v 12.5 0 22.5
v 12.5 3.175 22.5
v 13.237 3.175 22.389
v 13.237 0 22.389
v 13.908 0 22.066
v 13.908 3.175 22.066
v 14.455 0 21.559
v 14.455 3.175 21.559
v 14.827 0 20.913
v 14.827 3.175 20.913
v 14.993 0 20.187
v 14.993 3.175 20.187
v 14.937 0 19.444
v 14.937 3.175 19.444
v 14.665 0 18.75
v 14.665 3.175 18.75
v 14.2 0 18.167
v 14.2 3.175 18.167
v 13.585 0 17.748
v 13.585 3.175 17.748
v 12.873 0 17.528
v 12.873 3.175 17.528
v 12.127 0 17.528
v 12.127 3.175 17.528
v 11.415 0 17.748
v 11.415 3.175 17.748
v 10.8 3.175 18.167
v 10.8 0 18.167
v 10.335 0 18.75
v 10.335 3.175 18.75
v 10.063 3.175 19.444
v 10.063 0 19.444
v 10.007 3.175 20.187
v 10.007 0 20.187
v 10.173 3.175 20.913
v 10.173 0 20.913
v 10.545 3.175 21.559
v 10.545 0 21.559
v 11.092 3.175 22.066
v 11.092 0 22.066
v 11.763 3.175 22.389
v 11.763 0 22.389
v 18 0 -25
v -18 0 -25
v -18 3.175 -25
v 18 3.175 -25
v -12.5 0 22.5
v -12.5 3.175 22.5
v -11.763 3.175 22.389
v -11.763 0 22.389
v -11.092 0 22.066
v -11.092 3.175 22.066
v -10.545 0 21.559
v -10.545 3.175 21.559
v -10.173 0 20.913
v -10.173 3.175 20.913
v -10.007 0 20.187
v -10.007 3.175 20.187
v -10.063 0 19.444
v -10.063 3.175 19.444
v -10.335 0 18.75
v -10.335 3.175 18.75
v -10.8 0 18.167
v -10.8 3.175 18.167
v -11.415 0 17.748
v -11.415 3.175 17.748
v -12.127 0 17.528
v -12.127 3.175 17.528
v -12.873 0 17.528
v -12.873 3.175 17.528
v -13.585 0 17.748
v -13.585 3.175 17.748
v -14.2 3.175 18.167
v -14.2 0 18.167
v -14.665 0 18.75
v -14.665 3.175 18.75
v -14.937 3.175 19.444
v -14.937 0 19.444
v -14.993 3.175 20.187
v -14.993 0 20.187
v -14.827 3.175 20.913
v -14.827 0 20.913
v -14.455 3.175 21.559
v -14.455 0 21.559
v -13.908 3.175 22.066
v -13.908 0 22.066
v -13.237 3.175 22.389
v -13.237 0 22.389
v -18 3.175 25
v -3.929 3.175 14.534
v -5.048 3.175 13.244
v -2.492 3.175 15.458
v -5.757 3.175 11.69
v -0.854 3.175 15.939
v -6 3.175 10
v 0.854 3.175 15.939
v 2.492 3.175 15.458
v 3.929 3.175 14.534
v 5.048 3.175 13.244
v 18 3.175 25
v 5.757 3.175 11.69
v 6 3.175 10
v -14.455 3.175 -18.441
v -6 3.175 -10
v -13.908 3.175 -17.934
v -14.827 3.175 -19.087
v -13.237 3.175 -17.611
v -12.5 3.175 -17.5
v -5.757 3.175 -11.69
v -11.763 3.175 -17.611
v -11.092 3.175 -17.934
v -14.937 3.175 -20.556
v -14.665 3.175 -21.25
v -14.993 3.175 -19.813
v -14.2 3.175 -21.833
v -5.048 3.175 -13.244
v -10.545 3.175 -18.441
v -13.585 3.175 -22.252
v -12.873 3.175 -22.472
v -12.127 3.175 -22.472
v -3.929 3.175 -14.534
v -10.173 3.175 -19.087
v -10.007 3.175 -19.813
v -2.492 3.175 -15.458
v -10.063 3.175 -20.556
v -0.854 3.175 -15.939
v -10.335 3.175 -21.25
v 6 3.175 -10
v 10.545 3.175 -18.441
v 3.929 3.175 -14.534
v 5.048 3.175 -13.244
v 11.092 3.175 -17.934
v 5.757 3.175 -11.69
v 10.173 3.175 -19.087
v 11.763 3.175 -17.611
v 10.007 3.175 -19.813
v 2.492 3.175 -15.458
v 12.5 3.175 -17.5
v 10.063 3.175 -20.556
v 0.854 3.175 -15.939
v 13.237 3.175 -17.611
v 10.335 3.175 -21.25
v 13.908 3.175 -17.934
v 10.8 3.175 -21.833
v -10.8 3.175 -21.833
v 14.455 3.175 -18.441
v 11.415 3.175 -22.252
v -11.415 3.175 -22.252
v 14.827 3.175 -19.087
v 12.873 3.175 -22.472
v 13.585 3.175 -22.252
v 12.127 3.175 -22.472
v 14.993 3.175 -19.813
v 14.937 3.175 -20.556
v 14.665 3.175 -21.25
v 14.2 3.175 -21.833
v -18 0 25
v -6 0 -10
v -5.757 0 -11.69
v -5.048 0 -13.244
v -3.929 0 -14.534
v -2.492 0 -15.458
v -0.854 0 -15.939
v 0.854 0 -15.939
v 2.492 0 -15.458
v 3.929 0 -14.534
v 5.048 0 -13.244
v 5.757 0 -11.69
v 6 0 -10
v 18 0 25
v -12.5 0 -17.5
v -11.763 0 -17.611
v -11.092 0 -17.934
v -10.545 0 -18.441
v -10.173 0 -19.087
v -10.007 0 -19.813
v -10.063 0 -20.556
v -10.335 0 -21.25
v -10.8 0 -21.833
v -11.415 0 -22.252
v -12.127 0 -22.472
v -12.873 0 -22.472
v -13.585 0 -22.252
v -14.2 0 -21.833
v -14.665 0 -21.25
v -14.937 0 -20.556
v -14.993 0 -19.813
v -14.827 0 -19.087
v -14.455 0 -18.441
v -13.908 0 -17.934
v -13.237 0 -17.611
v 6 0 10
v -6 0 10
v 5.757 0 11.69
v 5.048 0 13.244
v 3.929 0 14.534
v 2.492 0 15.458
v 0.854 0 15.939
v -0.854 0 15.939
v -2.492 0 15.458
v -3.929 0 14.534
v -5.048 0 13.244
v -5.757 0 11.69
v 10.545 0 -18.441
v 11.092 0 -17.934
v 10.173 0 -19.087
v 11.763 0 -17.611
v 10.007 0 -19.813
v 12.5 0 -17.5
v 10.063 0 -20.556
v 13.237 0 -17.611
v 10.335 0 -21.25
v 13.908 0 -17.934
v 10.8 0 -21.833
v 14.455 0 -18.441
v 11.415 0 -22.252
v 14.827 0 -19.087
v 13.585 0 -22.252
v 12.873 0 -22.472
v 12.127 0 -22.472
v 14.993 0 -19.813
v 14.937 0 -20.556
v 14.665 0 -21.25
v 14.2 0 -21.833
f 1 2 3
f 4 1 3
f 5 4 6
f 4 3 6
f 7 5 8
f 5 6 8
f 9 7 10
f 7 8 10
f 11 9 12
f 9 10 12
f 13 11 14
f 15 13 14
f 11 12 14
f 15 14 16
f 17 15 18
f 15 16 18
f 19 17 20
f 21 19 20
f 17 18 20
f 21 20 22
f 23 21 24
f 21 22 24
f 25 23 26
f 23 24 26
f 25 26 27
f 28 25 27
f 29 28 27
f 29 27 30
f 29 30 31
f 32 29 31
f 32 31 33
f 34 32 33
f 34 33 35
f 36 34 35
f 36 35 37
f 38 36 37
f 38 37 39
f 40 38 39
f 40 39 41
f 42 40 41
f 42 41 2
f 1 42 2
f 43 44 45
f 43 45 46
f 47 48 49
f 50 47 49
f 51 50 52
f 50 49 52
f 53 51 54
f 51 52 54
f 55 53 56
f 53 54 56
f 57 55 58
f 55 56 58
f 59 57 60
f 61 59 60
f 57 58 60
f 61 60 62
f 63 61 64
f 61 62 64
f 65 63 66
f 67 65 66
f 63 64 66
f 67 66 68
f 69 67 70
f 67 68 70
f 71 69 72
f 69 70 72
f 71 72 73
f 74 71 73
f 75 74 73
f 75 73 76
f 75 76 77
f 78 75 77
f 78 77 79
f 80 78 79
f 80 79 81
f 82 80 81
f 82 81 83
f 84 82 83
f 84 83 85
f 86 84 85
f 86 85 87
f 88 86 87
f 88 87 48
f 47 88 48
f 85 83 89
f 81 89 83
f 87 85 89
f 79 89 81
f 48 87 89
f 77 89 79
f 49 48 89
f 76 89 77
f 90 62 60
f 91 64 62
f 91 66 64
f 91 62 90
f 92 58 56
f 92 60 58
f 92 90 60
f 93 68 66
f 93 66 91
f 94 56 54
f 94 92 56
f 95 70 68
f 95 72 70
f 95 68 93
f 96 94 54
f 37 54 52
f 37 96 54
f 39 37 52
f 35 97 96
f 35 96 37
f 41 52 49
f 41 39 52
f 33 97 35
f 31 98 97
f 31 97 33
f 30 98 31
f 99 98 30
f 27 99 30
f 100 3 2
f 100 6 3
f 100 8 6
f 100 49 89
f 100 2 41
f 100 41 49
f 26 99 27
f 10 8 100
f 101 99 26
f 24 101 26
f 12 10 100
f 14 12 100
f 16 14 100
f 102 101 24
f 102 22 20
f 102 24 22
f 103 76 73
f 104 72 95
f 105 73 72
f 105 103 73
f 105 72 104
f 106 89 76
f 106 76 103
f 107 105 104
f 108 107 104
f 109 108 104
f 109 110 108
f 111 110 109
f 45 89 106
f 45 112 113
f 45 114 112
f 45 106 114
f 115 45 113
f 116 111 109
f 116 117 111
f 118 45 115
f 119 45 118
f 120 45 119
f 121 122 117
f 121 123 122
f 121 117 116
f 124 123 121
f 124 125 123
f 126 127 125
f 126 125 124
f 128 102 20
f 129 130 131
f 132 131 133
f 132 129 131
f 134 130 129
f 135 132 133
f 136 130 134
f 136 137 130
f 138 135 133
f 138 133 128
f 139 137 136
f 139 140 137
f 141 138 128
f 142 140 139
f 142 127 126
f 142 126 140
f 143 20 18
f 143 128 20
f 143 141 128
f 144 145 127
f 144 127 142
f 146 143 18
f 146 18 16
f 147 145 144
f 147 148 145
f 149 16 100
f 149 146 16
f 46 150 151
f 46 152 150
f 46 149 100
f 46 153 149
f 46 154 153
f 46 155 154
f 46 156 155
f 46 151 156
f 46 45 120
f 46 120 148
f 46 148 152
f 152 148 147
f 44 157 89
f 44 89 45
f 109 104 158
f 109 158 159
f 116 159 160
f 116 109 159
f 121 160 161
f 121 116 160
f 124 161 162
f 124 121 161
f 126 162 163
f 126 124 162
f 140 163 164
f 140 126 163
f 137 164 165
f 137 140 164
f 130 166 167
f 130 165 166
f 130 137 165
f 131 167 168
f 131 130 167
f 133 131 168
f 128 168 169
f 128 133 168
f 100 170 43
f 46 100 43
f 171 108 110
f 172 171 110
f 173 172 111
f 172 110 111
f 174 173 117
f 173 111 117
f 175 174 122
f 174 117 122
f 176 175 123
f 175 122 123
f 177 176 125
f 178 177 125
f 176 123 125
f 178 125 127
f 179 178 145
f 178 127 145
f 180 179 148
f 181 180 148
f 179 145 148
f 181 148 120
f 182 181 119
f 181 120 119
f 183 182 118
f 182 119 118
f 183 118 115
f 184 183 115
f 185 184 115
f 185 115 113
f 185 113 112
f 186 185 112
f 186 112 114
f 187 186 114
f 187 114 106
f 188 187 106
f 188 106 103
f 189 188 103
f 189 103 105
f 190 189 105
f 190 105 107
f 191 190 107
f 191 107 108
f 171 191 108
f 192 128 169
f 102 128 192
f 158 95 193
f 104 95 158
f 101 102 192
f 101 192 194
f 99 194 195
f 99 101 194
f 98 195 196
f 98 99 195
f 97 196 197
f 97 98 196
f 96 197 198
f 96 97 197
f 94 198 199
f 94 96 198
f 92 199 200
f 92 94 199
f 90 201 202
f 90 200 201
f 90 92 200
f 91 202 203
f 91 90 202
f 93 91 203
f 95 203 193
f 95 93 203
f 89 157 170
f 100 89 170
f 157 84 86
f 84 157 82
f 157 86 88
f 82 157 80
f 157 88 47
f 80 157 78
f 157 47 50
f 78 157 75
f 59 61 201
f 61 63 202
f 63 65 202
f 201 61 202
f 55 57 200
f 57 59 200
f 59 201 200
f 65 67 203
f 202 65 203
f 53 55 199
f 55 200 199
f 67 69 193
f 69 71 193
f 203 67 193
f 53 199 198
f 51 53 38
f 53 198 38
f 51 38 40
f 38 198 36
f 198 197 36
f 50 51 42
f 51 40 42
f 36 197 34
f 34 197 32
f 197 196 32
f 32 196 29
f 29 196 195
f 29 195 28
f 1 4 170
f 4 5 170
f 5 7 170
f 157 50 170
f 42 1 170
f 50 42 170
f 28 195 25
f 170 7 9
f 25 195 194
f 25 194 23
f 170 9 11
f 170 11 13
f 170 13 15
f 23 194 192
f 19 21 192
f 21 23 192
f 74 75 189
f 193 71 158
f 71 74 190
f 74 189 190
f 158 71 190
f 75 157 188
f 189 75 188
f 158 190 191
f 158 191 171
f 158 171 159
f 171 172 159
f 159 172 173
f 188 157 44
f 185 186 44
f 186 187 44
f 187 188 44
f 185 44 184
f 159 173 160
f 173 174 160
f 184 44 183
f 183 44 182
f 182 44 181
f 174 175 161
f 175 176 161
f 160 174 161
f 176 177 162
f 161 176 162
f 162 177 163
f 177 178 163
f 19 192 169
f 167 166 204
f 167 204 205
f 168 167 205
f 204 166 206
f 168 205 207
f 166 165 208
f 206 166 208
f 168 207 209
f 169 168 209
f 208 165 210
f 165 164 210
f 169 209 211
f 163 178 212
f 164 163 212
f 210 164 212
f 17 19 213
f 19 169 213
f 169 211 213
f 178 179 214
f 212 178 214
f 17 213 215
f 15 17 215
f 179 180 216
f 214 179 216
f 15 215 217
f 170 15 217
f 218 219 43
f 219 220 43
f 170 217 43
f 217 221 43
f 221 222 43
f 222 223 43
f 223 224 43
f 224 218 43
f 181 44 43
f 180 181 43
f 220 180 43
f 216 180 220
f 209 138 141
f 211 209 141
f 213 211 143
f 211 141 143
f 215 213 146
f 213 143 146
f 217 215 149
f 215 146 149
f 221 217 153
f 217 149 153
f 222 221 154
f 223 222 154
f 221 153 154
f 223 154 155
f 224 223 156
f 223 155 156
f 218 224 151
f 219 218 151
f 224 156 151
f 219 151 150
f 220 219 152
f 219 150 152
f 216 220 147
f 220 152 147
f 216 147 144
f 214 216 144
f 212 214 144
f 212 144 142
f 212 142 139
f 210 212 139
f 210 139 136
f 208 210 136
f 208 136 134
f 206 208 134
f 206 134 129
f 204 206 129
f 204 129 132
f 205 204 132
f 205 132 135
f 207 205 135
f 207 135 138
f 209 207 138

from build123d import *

# Parameters (mm, degrees)
SKETCH1_W           = 36
SKETCH1_H           = 50
BOSS_EXTRUDE1_DEPTH = 3.175
CUT_EXTRUDE1_REACH  = 32.969
SKETCH3_R           = 2.5
CUT_EXTRUDE2_REACH  = 32.969


with BuildPart() as part:
    # Sketch1 → Boss-Extrude1 (new body)
    with BuildSketch(Plane(origin=(0, 0, 0), x_dir=(1, 0, 0), z_dir=(0, 1, 0))):
        Rectangle(SKETCH1_W, SKETCH1_H)
    extrude(amount=BOSS_EXTRUDE1_DEPTH)

    # Sketch3 → Cut-Extrude1 (cut, up to next)
    with BuildSketch(Plane(origin=(0, 3.175, 0), x_dir=(1, 0, 0), z_dir=(0, 1, 0)), mode=Mode.PRIVATE) as cut_extrude1_sk1:
        with Locations(Location((-12.5, 20, 0), (0, 0, 270))):
            Circle(SKETCH3_R)
    cut_extrude1_tool1 = extrude(cut_extrude1_sk1.sketch, amount=-CUT_EXTRUDE1_REACH, mode=Mode.PRIVATE) & part.part
    # Sketch3 → Cut-Extrude1 (cut, up to next)
    with BuildSketch(Plane(origin=(0, 3.175, 0), x_dir=(1, 0, 0), z_dir=(0, 1, 0)), mode=Mode.PRIVATE) as cut_extrude1_sk2:
        with Locations(Location((12.5, 20, 0), (0, 0, 270))):
            Circle(SKETCH3_R)
    cut_extrude1_tool2 = extrude(cut_extrude1_sk2.sketch, amount=-CUT_EXTRUDE1_REACH, mode=Mode.PRIVATE) & part.part
    # Sketch3 → Cut-Extrude1 (cut, up to next)
    with BuildSketch(Plane(origin=(0, 3.175, 0), x_dir=(1, 0, 0), z_dir=(0, 1, 0)), mode=Mode.PRIVATE) as cut_extrude1_sk3:
        with Locations(Location((12.5, -20, 0), (0, 0, 270))):
            Circle(SKETCH3_R)
    cut_extrude1_tool3 = extrude(cut_extrude1_sk3.sketch, amount=-CUT_EXTRUDE1_REACH, mode=Mode.PRIVATE) & part.part
    # Sketch3 → Cut-Extrude1 (cut, up to next)
    with BuildSketch(Plane(origin=(0, 3.175, 0), x_dir=(1, 0, 0), z_dir=(0, 1, 0)), mode=Mode.PRIVATE) as cut_extrude1_sk4:
        with Locations(Location((-12.5, -20, 0), (0, 0, 270))):
            Circle(SKETCH3_R)
    cut_extrude1_tool4 = extrude(cut_extrude1_sk4.sketch, amount=-CUT_EXTRUDE1_REACH, mode=Mode.PRIVATE) & part.part
    add(cut_extrude1_tool1.solids().sort_by_distance((-12.5, 3.175, -20))[0], mode=Mode.SUBTRACT)
    add(cut_extrude1_tool2.solids().sort_by_distance((12.5, 3.175, -20))[0], mode=Mode.SUBTRACT)
    add(cut_extrude1_tool3.solids().sort_by_distance((12.5, 3.175, 20))[0], mode=Mode.SUBTRACT)
    add(cut_extrude1_tool4.solids().sort_by_distance((-12.5, 3.175, 20))[0], mode=Mode.SUBTRACT)

    # Sketch4 → Cut-Extrude2 (cut, up to next)
    with BuildSketch(Plane(origin=(0, 3.175, 0), x_dir=(1, 0, 0), z_dir=(0, 1, 0)), mode=Mode.PRIVATE) as cut_extrude2_sk1:
        with BuildLine():
            Line((-6, -10), (-6, 10))
            ThreePointArc((-6, 10), (0, 16), (6, 10))
            Line((6, 10), (6, -10))
            ThreePointArc((6, -10), (0, -16), (-6, -10))
        make_face()
    cut_extrude2_tool1 = extrude(cut_extrude2_sk1.sketch, amount=-CUT_EXTRUDE2_REACH, mode=Mode.PRIVATE) & part.part
    add(cut_extrude2_tool1.solids().sort_by_distance((0, 3.175, 0))[0], mode=Mode.SUBTRACT)


solid = part.part
